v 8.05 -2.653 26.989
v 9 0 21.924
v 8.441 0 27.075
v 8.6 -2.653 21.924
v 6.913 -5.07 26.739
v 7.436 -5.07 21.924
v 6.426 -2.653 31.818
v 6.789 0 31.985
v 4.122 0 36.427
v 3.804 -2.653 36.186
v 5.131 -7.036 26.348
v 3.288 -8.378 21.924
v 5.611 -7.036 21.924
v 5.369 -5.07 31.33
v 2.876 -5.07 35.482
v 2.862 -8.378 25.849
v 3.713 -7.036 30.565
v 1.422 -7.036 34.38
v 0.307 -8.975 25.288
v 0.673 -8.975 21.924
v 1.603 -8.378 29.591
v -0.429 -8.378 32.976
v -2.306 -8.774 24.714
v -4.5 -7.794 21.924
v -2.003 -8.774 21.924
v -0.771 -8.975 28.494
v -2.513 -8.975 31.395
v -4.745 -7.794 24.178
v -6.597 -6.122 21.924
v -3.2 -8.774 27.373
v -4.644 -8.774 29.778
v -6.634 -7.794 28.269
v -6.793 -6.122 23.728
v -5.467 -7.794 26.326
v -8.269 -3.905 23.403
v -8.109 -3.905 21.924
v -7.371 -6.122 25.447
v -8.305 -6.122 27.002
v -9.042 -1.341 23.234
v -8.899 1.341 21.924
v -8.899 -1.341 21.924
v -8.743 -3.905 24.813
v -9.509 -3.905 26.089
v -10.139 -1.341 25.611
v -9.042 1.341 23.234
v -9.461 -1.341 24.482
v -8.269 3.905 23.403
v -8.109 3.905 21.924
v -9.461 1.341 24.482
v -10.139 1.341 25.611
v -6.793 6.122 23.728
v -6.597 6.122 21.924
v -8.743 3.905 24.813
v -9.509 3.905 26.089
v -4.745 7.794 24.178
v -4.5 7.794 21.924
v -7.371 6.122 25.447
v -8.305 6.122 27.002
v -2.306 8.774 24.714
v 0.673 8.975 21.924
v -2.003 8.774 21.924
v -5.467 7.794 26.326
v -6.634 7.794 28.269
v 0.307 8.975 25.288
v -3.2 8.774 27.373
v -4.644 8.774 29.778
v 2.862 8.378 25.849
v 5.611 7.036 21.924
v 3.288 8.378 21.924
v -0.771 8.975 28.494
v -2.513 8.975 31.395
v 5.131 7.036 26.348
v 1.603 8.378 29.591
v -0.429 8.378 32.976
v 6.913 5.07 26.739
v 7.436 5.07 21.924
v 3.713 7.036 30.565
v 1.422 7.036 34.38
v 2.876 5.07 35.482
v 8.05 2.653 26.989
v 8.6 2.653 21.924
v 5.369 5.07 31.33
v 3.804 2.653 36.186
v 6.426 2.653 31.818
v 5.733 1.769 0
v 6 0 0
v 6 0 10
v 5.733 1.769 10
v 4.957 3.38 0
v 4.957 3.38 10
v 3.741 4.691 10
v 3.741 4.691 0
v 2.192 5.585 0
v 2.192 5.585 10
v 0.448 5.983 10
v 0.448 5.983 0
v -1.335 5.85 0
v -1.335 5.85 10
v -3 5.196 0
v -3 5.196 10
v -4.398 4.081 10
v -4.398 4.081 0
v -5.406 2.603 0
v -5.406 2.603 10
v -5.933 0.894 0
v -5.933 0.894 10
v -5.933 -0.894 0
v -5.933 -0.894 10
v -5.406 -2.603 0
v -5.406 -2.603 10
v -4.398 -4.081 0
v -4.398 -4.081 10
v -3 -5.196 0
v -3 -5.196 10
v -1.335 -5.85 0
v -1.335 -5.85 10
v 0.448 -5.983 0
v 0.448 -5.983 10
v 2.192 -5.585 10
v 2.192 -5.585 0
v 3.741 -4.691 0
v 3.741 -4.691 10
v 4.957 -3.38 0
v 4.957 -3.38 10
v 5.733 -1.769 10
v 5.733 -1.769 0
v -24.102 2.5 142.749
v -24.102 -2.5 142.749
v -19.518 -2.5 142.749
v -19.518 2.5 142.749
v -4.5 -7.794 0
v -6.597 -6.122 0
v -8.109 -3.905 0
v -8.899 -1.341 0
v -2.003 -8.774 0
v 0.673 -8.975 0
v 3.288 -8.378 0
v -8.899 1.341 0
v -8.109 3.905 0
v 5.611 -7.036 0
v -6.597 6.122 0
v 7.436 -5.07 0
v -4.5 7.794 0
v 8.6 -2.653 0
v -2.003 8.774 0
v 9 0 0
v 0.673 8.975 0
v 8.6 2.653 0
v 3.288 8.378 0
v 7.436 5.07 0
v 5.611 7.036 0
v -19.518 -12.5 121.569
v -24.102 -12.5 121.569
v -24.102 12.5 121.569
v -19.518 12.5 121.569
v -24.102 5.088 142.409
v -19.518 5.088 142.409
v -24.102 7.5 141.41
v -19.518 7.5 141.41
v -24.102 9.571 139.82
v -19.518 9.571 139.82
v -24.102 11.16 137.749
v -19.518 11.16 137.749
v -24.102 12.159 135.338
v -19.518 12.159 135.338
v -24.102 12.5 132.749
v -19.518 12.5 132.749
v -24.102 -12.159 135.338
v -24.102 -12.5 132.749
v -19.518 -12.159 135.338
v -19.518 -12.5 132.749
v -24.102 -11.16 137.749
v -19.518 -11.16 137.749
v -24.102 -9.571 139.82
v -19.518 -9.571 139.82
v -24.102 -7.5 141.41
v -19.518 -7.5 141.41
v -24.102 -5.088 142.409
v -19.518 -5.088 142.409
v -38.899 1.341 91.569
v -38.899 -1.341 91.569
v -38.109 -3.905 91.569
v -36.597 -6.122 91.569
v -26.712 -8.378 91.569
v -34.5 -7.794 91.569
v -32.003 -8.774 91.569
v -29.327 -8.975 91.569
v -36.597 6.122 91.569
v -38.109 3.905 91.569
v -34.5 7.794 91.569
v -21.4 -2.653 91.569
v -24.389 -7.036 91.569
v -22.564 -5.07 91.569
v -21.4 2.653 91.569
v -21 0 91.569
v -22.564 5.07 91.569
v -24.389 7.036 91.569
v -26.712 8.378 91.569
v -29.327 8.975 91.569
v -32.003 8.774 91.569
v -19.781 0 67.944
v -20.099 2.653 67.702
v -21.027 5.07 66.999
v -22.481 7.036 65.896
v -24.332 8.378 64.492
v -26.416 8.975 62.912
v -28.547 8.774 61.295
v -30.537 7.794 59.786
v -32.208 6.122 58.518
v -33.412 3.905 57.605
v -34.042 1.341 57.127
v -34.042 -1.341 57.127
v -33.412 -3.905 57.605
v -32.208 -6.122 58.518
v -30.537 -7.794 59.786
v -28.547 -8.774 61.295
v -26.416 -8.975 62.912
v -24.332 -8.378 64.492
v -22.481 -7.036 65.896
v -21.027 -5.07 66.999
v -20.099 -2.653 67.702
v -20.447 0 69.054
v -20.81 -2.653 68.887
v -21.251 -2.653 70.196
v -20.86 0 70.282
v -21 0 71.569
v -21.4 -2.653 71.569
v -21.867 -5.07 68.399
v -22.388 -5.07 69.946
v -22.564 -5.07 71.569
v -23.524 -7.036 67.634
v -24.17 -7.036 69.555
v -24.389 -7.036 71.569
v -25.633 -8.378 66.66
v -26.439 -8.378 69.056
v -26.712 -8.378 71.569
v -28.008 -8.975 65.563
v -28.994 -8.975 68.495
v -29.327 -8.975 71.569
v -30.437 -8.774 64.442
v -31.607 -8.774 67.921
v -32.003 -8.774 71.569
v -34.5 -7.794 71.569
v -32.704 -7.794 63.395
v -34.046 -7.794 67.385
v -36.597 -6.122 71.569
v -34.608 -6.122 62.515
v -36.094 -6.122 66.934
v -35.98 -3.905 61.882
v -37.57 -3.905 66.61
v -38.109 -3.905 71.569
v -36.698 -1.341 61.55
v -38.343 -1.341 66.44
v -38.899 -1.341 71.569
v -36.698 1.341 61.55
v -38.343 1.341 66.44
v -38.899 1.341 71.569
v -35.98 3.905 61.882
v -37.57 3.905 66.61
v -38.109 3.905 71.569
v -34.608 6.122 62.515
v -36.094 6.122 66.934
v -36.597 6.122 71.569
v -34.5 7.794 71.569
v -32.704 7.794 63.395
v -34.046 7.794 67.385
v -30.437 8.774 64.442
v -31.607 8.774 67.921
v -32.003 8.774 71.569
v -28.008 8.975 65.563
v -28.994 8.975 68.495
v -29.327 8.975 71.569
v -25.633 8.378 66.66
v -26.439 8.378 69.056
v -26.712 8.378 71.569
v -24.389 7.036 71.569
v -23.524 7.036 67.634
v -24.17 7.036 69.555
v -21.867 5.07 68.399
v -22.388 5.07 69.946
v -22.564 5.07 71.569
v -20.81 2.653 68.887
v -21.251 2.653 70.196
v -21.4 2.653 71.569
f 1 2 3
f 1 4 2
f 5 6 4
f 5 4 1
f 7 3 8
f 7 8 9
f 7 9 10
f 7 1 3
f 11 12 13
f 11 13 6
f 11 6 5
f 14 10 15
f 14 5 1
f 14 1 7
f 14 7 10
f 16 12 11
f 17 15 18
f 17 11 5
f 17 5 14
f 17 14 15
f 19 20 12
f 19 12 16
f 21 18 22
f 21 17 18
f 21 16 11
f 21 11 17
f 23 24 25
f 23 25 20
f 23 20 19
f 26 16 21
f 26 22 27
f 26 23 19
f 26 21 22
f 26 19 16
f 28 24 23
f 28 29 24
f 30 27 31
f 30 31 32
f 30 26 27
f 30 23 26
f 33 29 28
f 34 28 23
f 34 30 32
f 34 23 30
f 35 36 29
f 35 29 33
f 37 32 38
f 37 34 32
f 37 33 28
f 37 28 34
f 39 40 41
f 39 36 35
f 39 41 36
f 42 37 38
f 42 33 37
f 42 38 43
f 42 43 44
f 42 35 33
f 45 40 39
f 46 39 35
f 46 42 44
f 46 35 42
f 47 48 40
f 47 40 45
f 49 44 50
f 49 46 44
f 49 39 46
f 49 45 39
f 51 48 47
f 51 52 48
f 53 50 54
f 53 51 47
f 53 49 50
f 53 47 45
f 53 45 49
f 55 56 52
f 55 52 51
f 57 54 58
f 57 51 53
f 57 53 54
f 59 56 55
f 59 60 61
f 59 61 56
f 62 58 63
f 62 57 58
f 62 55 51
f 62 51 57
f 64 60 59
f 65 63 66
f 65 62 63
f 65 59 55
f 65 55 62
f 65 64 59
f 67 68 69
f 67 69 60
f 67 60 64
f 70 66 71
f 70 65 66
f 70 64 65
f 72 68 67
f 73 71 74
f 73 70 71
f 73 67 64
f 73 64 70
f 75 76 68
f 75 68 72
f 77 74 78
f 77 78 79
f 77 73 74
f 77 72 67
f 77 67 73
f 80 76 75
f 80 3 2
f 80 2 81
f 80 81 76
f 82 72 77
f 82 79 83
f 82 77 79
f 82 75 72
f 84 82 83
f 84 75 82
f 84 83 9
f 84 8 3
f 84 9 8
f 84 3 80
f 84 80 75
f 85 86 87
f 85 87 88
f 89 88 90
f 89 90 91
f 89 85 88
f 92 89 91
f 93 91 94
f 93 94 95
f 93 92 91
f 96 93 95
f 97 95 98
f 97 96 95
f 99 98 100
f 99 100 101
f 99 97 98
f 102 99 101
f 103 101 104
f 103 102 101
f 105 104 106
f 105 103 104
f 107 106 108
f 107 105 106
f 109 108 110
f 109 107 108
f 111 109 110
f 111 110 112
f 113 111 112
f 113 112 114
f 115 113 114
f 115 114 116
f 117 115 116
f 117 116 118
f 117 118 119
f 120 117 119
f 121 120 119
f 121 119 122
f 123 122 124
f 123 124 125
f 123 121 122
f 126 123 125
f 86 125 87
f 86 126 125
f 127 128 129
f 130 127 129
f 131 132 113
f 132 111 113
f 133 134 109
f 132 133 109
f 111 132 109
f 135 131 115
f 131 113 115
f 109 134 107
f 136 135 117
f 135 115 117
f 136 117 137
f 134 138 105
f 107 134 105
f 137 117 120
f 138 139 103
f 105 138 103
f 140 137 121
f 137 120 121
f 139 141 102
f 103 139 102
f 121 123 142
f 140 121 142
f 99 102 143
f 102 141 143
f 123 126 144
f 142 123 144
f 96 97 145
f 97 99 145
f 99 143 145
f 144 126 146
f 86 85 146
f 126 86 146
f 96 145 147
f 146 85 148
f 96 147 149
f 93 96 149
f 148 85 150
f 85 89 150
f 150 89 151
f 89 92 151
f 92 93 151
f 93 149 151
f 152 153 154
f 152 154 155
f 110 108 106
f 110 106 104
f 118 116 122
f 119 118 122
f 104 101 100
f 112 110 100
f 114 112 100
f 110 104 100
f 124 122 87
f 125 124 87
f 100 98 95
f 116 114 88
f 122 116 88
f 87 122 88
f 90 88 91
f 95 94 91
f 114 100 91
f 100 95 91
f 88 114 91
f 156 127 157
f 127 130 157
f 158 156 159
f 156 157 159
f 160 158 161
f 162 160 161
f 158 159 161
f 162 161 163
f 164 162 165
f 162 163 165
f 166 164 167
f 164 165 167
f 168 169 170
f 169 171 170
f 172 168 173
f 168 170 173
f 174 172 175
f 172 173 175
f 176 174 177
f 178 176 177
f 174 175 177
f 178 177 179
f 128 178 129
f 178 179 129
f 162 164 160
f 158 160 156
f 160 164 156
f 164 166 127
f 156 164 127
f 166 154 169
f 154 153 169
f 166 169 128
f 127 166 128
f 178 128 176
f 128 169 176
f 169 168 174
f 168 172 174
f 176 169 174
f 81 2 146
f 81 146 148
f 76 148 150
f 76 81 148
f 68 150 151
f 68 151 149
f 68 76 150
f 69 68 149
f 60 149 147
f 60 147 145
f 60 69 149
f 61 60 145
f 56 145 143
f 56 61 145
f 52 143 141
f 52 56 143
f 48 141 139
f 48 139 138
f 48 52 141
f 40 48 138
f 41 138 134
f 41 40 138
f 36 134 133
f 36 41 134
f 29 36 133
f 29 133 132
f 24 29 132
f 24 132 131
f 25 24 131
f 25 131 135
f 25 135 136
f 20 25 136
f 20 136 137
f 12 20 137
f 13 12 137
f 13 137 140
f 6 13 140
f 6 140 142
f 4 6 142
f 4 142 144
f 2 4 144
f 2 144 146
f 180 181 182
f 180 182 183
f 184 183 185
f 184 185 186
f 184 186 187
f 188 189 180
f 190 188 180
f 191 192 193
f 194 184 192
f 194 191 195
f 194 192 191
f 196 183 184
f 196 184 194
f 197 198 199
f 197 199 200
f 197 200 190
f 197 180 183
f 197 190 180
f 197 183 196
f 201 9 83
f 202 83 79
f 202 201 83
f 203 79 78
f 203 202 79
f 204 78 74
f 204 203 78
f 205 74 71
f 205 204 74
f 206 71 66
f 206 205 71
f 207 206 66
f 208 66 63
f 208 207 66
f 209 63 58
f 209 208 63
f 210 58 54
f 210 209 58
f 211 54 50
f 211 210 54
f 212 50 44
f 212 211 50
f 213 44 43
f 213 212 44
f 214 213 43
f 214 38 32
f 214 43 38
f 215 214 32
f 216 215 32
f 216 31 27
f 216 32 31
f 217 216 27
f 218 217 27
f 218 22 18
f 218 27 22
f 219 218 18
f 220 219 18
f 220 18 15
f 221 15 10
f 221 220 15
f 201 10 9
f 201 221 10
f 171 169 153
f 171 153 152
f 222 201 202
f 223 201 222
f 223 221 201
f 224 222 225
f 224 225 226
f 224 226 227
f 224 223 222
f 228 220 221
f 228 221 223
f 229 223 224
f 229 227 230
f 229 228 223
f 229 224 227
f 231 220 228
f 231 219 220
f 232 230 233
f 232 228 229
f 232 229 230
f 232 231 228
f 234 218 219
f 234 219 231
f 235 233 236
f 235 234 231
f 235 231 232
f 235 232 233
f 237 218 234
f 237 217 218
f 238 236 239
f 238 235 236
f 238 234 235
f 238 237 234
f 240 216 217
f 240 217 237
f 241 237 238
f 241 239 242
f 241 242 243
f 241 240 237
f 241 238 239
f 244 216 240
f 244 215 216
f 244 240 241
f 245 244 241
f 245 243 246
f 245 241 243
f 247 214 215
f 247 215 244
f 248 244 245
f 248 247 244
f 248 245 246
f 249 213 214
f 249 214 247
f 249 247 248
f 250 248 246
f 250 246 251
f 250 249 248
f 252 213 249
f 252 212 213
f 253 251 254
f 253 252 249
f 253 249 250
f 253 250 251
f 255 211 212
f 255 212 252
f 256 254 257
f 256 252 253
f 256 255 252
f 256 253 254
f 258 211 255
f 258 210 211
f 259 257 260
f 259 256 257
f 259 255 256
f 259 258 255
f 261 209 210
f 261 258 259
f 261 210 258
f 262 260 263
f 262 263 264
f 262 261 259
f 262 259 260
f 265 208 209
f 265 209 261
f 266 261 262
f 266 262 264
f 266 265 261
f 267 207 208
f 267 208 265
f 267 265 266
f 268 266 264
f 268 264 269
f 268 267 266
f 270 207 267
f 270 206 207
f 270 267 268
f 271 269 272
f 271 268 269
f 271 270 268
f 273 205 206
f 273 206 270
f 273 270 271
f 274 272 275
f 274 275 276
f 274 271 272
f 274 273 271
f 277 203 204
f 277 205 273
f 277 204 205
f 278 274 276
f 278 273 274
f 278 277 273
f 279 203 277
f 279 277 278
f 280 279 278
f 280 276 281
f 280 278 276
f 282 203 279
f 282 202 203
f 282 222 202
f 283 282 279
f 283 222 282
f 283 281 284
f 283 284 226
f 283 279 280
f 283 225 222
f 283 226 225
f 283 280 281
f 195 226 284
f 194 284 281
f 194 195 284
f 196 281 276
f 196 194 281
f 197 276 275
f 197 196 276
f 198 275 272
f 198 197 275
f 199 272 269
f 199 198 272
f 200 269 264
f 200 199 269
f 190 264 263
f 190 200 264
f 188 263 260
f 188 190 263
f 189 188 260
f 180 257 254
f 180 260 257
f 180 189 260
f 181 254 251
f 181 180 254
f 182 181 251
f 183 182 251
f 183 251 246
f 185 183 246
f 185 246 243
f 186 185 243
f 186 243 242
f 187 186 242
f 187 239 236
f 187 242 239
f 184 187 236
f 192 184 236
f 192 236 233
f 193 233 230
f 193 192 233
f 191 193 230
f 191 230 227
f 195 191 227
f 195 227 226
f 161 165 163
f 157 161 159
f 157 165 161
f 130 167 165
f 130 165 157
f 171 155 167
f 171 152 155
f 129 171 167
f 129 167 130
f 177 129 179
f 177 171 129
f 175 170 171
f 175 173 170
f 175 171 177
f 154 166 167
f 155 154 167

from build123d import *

# Parameters (mm, degrees)
F0_R      = 9
F3_W      = 4.5837214408
F3_H      = 21.1799524822
F4_DEPTH  = 12.5
F8_R      = 6
F9_DEPTH  = 10
F10_R     = 5.88688452
F11_DEPTH = 25
F12_R     = 10


# Not quite as in the source:
# - the program builds the solid bodies; features that only make, move or delete a surface that nothing else refers to are left out


with BuildPart() as f2:
    # F2: sweep along a path in F1
    with BuildLine(Plane.XZ) as f2_path:
        Line((0, 0), (0, 21.9242861825))
        ThreePointArc((0, 21.9242861825), (-0.7825412605, 26.7059037947), (-3.0485155987, 30.9886129972))
        Line((-3.0485155987, 30.9886129972), (-26.9514844013, 62.505124331))
        ThreePointArc((-26.9514844013, 62.505124331), (-29.2174587395, 66.7878335335), (-30, 71.5694511458))
        Line((-30, 71.5694511458), (-30, 91.5694511458))
    # F0 (on Top) → F2 (sweep)
    with BuildSketch(Plane.XY):
        Circle(F0_R)
    sweep(path=f2_path.line)

    # F8 (on Top) → F9 (cut)
    with BuildSketch(Plane.XY):
        Circle(F8_R)
    extrude(amount=F9_DEPTH, mode=Mode.SUBTRACT)

    # F10 (on face) → F11 (cut)
    with BuildSketch(Plane.YZ.offset(-19.5183108238)):
        with Locations((0, 164.4262522459)):
            Circle(F10_R)
    extrude(amount=-F11_DEPTH, mode=Mode.SUBTRACT)


with BuildPart() as f4:
    # F3 (on Front) → F4 (new body, symmetric)
    with BuildSketch(Plane.XZ):
        with Locations((-21.8101715442, 132.1594273869)):
            Rectangle(F3_W, F3_H)
    extrude(amount=F4_DEPTH, both=True)

    # F12
    f12_edges = [f4.edges().sort_by_distance(p)[0] for p in [
        (-21.810172, -12.5, 142.749404),
        (-21.810172, 12.5, 142.749404),
    ]]
    fillet(f12_edges, radius=F12_R)


solid = Compound([f2.part, f4.part])
